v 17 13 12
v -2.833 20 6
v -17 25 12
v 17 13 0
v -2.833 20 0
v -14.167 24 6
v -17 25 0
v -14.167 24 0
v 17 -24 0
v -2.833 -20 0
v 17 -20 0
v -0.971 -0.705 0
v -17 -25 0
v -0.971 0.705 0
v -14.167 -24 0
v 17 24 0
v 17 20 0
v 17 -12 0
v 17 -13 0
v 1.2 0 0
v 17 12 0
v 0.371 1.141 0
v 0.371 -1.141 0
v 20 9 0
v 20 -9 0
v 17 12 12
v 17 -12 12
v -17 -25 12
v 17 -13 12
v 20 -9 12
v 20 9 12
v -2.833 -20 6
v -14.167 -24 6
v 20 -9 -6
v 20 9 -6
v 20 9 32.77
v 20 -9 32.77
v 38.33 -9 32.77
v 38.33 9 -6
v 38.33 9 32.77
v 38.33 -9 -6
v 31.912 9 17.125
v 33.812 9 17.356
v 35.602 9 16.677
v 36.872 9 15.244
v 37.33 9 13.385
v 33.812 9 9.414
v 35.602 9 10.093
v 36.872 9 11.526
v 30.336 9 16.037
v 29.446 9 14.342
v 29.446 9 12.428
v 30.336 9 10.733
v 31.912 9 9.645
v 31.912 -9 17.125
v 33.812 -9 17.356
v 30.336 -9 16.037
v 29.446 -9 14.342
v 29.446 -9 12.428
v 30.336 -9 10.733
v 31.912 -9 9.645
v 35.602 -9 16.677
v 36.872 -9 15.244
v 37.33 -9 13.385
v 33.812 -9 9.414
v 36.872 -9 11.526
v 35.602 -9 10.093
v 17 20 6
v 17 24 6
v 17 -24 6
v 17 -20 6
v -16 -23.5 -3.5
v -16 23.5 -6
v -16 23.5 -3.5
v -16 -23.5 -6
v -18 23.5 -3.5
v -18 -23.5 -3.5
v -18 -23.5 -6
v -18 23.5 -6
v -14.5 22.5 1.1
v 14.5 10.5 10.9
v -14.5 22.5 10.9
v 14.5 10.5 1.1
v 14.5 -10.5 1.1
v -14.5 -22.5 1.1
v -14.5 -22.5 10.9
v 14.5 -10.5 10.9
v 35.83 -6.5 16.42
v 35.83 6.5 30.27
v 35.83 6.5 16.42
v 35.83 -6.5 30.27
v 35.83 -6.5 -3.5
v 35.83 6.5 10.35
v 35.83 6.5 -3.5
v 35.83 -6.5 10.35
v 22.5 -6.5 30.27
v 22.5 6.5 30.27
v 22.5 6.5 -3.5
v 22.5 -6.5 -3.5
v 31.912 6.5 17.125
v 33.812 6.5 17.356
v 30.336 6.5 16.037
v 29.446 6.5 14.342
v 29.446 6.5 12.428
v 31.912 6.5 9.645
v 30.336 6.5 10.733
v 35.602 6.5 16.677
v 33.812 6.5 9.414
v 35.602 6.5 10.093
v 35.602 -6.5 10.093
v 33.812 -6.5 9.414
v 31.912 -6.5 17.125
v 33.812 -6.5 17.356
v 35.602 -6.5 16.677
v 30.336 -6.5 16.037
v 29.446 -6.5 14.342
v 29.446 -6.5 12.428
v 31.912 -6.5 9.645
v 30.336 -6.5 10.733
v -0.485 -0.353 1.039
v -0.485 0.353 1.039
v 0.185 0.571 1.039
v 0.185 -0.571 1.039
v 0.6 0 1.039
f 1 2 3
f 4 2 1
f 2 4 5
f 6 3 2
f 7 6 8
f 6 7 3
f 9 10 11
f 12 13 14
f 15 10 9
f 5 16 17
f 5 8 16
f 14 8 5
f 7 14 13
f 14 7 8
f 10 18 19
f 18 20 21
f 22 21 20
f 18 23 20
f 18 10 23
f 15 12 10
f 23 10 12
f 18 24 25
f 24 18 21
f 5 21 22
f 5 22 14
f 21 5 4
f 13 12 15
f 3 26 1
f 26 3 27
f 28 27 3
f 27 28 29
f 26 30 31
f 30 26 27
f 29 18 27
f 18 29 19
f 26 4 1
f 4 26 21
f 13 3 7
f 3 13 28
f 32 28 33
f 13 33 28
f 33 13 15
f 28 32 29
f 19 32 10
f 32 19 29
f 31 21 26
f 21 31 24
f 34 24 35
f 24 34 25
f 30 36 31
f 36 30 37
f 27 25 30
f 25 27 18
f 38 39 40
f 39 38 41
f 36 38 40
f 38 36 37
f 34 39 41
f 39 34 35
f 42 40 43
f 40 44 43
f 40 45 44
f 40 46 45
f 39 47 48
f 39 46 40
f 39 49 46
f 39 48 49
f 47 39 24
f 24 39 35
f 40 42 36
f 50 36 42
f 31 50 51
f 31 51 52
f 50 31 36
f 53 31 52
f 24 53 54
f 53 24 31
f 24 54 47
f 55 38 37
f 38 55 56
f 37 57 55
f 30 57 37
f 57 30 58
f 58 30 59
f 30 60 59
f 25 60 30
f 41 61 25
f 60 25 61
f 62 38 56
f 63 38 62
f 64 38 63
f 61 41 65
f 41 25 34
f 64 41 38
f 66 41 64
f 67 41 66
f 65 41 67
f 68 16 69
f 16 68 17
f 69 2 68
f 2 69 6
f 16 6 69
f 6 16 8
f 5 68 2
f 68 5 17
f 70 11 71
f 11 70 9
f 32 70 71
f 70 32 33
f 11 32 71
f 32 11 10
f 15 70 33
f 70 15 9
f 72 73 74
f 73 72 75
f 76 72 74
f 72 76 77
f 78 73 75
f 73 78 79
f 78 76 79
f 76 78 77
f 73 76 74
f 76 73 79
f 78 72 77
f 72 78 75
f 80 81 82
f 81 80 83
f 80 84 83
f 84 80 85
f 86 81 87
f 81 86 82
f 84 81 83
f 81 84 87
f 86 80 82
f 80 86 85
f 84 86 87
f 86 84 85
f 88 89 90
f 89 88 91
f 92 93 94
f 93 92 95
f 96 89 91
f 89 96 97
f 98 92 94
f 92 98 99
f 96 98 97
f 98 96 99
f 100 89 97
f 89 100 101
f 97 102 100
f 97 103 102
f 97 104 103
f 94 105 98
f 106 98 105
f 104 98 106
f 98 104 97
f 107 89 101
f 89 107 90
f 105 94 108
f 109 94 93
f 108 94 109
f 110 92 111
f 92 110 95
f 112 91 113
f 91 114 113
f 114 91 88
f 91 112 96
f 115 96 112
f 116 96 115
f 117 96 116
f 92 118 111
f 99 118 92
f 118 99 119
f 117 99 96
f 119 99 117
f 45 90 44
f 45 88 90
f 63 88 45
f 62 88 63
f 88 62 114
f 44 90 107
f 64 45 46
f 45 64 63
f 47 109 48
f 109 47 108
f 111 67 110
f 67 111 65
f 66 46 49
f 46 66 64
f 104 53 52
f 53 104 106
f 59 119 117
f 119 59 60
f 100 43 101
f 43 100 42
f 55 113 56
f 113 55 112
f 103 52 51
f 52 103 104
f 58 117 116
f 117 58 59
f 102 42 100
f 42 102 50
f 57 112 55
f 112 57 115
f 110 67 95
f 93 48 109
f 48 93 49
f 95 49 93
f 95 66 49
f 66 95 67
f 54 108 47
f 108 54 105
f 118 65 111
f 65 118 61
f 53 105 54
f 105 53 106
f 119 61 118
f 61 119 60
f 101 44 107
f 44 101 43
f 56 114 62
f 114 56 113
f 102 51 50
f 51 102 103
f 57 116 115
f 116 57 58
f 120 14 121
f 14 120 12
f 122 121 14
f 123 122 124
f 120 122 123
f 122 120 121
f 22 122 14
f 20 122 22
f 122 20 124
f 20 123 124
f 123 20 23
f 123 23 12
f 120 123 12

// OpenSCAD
// Parameters
bbox_X = 52.33; //[26.165:104.66:0.01]
bbox_Y = 50; //[25:100:0.01]
bbox_Z = 38.77; //[19.385:77.54:0.01]
plate_len_X = 34; //[17:68:0.01]
plate_max_W_Y = 50; //[25:100:0.01]
plate_min_W_Y = 26; //[13:52:0.01]
plate_H_Z = 12; //[6:24:0.01]
stem_len_X = 18.33; //[9.165:36.66:0.01]
stem_W_Y = 18; //[9:36:0.01]
stem_H_Z = 38.77; //[19.385:77.54:0.01]
neck_len_X = 4; //[2:8:0.01]
hole_d = 8; //[4:16:0.01]
hole_center_from_stem_end_X = 6; //[3:12:0.01]
hole_center_Z = 19.385; //[9.6925:38.77:0.01]
ridge_height_Z = 2; //[1:4:0.01]
ridge_base_W_Y = 10; //[5:20:0.01]
step_depth_Y = 4; //[2:8:0.01]
step_height_Z = 6; //[3:12:0.01]
wall_t = 2.2; //[1.1:4.4:0.01]
relief_margin = 2.5; //[1.25:5:0.01]
overlap = 1; //[0.5:2:0.01]
chamfer_r = 1.2; //[0.6:2.4:0.01]
lip_thk_X = 2; //[1:4:0.01]
lip_H_Z = 2.5; //[1.25:5:0.01]
lip_inset_Y = 1.5; //[0.75:3:0.01]

// Base Shapes
module v_flared_plate_main_body() {
  linear_extrude(height=plate_H_Z)
    polygon(points=[
      [-plate_len_X/2, -plate_max_W_Y/2],
      [-plate_len_X/2, plate_max_W_Y/2],
      [plate_len_X/2, plate_min_W_Y/2],
      [plate_len_X/2, -plate_min_W_Y/2]
    ]);
}

module rectangular_stem() {
  translate([plate_len_X/2 + neck_len_X + stem_len_X/2 - overlap, 0, stem_H_Z/2 - plate_H_Z/2])
    cube([stem_len_X, stem_W_Y, stem_H_Z], center=true);
}

module transition_neck_between_v_plate_and_stem() {
  translate([plate_len_X/2 + neck_len_X/2 - overlap, 0, 0])
    linear_extrude(height=plate_H_Z)
      polygon(points=[
        [-neck_len_X/2, -plate_min_W_Y/2],
        [-neck_len_X/2, plate_min_W_Y/2],
        [neck_len_X/2, stem_W_Y/2],
        [neck_len_X/2, -stem_W_Y/2]
      ]);
}

module v_plate_central_ridge() {
  translate([0, 0, plate_H_Z/2 + ridge_height_Z/2 - overlap])
    linear_extrude(height=ridge_height_Z)
      polygon(points=[
        [-plate_len_X/2, -ridge_base_W_Y/2],
        [-plate_len_X/2, ridge_base_W_Y/2],
        [plate_len_X/2, 0]
      ]);
}

module stepped_side_profiles() {
  cube([plate_len_X, step_depth_Y, step_height_Z], center=true);
}

module internal_relief_pockets_to_reduce_solidity_plate() {
  translate([0, 0, wall_t/2])
    linear_extrude(height=plate_H_Z - wall_t)
      polygon(points=[
        [-plate_len_X/2 + relief_margin, -plate_max_W_Y/2 + relief_margin],
        [-plate_len_X/2 + relief_margin, plate_max_W_Y/2 - relief_margin],
        [plate_len_X/2 - relief_margin, plate_min_W_Y/2 - relief_margin],
        [plate_len_X/2 - relief_margin, -plate_min_W_Y/2 + relief_margin]
      ]);
}

module internal_relief_pockets_to_reduce_solidity_stem() {
  translate([plate_len_X/2 + neck_len_X + stem_len_X/2 - overlap, 0, stem_H_Z/2 - plate_H_Z/2])
    cube([stem_len_X - 2*relief_margin, stem_W_Y - 2*relief_margin, stem_H_Z - 2*relief_margin], center=true);
}

module stem_through_hole() {
  translate([plate_len_X/2 + neck_len_X + stem_len_X - hole_center_from_stem_end_X, 0, hole_center_Z - plate_H_Z/2])
    rotate([90, 0, 0])
      cylinder(r=hole_d/2, h=stem_W_Y + 2*overlap, center=true);
}

module small_locating_lips_or_stops() {
  translate([-plate_len_X/2 + lip_thk_X/2 - overlap, 0, -plate_H_Z/2 + lip_H_Z/2])
    cube([lip_thk_X, plate_max_W_Y - 2*lip_inset_Y, lip_H_Z], center=true);
}

module edge_chamfers_or_fillets_sphere() {
  sphere(r=chamfer_r, center=true);
}

// Assembly
module main_union_pre_relief() {
  union() {
    v_flared_plate_main_body();
    transition_neck_between_v_plate_and_stem();
    rectangular_stem();
    v_plate_central_ridge();
    translate([0, plate_max_W_Y/2 - step_depth_Y/2 - overlap, plate_H_Z/2 - step_height_Z/2])
      stepped_side_profiles();
    translate([0, -(plate_max_W_Y/2 - step_depth_Y/2 - overlap), plate_H_Z/2 - step_height_Z/2])
      stepped_side_profiles();
    small_locating_lips_or_stops();
  }
}

module main_with_reliefs() {
  difference() {
    main_union_pre_relief();
    internal_relief_pockets_to_reduce_solidity_plate();
    internal_relief_pockets_to_reduce_solidity_stem();
  }
}

module main_with_reliefs_and_hole() {
  difference() {
    main_with_reliefs();
    stem_through_hole();
  }
}

// Final Output
difference() {
  main_with_reliefs_and_hole();
  edge_chamfers_or_fillets_sphere();
}
